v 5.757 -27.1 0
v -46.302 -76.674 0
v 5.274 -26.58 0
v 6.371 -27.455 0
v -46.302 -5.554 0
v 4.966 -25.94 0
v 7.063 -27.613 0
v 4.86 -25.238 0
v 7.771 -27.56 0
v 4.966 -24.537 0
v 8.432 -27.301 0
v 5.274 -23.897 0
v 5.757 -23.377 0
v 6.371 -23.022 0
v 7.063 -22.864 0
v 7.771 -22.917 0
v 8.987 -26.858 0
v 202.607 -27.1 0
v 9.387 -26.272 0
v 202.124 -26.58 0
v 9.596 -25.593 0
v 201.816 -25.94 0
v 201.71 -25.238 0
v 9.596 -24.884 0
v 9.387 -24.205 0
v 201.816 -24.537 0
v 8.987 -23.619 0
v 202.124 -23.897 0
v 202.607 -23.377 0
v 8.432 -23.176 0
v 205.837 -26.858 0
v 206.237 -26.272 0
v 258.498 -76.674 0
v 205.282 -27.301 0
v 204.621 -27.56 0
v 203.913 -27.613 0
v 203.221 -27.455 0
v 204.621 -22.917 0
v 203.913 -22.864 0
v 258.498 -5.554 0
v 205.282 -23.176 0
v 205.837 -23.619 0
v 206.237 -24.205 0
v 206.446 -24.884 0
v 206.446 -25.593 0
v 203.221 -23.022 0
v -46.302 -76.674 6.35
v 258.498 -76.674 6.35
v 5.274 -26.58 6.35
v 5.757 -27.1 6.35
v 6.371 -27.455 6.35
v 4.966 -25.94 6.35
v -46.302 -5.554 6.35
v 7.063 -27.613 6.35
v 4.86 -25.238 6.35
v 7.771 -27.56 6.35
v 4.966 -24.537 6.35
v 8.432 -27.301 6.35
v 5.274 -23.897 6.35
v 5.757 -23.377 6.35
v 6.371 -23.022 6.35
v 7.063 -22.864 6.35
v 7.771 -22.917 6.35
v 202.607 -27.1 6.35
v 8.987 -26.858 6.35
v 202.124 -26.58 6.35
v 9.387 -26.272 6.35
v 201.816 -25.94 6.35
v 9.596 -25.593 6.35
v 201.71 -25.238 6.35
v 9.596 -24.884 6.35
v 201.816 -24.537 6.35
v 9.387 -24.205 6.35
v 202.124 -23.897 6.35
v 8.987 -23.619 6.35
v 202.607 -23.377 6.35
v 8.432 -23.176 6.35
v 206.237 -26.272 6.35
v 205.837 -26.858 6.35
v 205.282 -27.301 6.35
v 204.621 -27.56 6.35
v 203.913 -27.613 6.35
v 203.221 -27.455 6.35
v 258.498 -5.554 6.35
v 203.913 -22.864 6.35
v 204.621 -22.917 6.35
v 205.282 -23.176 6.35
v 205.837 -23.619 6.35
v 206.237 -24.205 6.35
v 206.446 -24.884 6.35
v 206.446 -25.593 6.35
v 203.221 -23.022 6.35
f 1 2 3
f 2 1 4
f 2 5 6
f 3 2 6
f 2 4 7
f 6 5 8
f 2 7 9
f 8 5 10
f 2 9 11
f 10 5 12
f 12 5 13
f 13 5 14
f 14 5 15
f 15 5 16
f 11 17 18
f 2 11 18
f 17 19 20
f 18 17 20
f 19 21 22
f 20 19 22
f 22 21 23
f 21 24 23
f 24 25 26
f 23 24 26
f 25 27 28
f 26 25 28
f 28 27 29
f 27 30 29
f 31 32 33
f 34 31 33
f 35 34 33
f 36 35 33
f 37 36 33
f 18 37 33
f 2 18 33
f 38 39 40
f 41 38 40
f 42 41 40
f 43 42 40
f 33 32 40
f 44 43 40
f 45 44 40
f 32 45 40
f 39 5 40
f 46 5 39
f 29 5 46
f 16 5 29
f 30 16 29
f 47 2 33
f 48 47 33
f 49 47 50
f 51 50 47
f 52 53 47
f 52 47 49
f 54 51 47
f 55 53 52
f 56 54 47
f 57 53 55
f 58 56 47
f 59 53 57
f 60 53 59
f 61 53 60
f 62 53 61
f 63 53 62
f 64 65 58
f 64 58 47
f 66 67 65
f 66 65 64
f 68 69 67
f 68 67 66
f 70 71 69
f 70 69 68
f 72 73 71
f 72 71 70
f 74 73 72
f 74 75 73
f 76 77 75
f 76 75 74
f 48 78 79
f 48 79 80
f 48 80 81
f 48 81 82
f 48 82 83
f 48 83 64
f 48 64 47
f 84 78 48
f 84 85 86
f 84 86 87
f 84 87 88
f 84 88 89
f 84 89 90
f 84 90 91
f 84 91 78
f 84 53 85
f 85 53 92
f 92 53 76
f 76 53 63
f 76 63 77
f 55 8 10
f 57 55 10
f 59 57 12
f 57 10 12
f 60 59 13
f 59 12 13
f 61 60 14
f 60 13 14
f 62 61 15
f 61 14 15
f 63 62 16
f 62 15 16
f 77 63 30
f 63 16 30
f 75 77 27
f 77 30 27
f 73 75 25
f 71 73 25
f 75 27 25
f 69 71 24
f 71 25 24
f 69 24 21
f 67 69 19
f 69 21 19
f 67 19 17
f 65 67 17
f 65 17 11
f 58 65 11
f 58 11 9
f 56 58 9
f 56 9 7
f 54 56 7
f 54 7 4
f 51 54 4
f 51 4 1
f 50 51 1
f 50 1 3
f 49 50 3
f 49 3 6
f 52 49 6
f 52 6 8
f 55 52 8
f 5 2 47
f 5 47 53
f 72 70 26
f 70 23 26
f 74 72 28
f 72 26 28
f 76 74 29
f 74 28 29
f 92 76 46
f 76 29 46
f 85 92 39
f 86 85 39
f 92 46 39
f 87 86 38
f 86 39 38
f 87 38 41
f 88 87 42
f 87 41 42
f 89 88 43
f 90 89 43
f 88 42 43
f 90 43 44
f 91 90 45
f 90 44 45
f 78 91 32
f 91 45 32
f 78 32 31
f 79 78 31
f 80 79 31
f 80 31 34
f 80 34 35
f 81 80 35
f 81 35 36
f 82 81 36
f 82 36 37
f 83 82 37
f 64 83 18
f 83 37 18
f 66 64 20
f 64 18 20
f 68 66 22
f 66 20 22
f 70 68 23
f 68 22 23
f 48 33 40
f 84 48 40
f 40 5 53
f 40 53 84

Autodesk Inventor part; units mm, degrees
ref_plane "YZ Plane" through (0, 0, 0) normal (1, 0, 0) x (0, 1, 0)
ref_plane "XZ Plane" through (0, 0, 0) normal (0, 1, 0) x (-1, 0, 0)
ref_plane "XY Plane" through (0, 0, 0) normal (0, 0, 1) x (1, 0, 0)
sketch "Sketch1" plane through (0, 0, 0) normal (0, 0, 1) x (1, 0, 0)
  line L0 (-39.9518, 9.6865) -> (252.1482, 9.6865)
  line L1 (252.1482, 9.6865) -> (252.1482, -91.9135)
  line L2 (252.1482, -91.9135) -> (-39.9518, -91.9135)
  line L3 (-39.9518, -91.9135) -> (-39.9518, 9.6865)
  point P0 (0, 0)
  dimension "d0" = 292.1
  dimension "d1" = 101.6
extrude "Extrusion1" add sketch "Sketch1" along normal blind 6.35
sketch "Sketch2" plane through (0, 0, 0) normal (0, 0, -1) x (-1, 0, 0)
  line L0 (39.9518, -91.9135) -> (33.6018, -91.9135)
  line L1 (33.6018, -91.9135) -> (33.6018, -76.6735)
  line L2 (33.6018, -76.6735) -> (39.9518, -76.6735)
  line L3 (39.9518, -76.6735) -> (39.9518, -91.9135)
  line L4 (-252.1482, 9.6865) -> (-245.7982, 9.6865)
  line L5 (-245.7982, 9.6865) -> (-245.7982, -5.5535)
  line L6 (-245.7982, -5.5535) -> (-252.1482, -5.5535)
  line L7 (-252.1482, -5.5535) -> (-252.1482, 9.6865)
  line L8 (-252.1482, -91.9135) -> (-245.7982, -91.9135)
  line L9 (-245.7982, -91.9135) -> (-245.7982, -76.6735)
  line L10 (-245.7982, -76.6735) -> (-252.1482, -76.6735)
  line L11 (-252.1482, -76.6735) -> (-252.1482, -91.9135)
  line L12 (39.9518, 9.6865) -> (33.6018, 9.6865)
  line L13 (33.6018, 9.6865) -> (33.6018, -5.5535)
  line L14 (33.6018, -5.5535) -> (39.9518, -5.5535)
  line L15 (39.9518, -5.5535) -> (39.9518, 9.6865)
  point P0 (0, 0)
  dimension "d4" = 6.35
  dimension "d5" = 15.24
  dimension "d6" = 6.35
  dimension "d7" = 15.24
extrude "Extrusion2" cut sketch "Sketch2" against normal blind 25.4
sketch "Sketch3" plane through (0, 0, 0) normal (0, 0, -1) x (-1, 0, 0)
  line L0 (-252.1482, -76.6735) -> (-258.4982, -76.6735)
  line L1 (-258.4982, -76.6735) -> (-258.4982, -5.5535)
  line L2 (-258.4982, -5.5535) -> (-252.1482, -5.5535)
  line L3 (-252.1482, -5.5535) -> (-252.1482, -76.6735)
  line L4 (39.9518, -76.6735) -> (46.3018, -76.6735)
  line L5 (46.3018, -76.6735) -> (46.3018, -5.5535)
  line L6 (46.3018, -5.5535) -> (39.9518, -5.5535)
  line L7 (39.9518, -5.5535) -> (39.9518, -76.6735)
  point P0 (0, 0)
  dimension "d10" = 6.35
  dimension "d11" = 6.35
extrude "Extrusion3" add sketch "Sketch3" against normal blind 6.35
sketch "Sketch4" plane through (0, 0, 0) normal (0, 0, -1) x (-1, 0, 0)
  line L0 (33.6018, 9.6865) -> (-245.7982, 9.6865) projected
  line L1 (-258.4982, -76.6735) -> (-245.7982, -76.6735) projected
  line L2 (-106.0982, 9.6865) -> (-106.0982, -25.2385)
  line L3 (-106.0982, -25.2385) -> (-204.0914, -25.2385)
  line L4 (-204.0914, -25.2385) -> (-7.2414, -25.2385)
  circle A0 centre (-7.2414, -25.2385) radius 2.3812
  circle A1 centre (-204.0914, -25.2385) radius 2.3813
  point P0 (0, 0)
  dimension "d14" = 34.925
  dimension "d15" = 97.9932
  dimension "d16" = 196.85
  dimension "d17" = 4.7625
extrude "Extrusion4" cut sketch "Sketch4" against normal blind 6.35
sketch "Sketch5" plane through (0, 0, 0) normal (0, 0, -1) x (-1, 0, 0)
  line L0 (-245.7982, -76.6735) -> (-245.7982, -91.9135) projected
  line L1 (-245.7982, -91.9135) -> (33.6018, -91.9135) projected
  line L2 (33.6018, -91.9135) -> (33.6018, -76.6735) projected
  line L3 (33.6018, -5.5535) -> (33.6018, 9.6865) projected
  line L4 (33.6018, 9.6865) -> (-245.7982, 9.6865) projected
  line L5 (-245.7982, 9.6865) -> (-245.7982, -5.5535) projected
  line L6 (-258.4982, -76.6735) -> (-245.7982, -76.6735) projected
  line L7 (33.6018, -5.5535) -> (-245.7982, -5.5535)
  line L8 (-245.7982, -76.6735) -> (33.6018, -76.6735)
  point P0 (0, 0)
extrude "Extrusion5" cut sketch "Sketch5" against normal blind 6.35
properties part number "kinect rotate2 bottom"
